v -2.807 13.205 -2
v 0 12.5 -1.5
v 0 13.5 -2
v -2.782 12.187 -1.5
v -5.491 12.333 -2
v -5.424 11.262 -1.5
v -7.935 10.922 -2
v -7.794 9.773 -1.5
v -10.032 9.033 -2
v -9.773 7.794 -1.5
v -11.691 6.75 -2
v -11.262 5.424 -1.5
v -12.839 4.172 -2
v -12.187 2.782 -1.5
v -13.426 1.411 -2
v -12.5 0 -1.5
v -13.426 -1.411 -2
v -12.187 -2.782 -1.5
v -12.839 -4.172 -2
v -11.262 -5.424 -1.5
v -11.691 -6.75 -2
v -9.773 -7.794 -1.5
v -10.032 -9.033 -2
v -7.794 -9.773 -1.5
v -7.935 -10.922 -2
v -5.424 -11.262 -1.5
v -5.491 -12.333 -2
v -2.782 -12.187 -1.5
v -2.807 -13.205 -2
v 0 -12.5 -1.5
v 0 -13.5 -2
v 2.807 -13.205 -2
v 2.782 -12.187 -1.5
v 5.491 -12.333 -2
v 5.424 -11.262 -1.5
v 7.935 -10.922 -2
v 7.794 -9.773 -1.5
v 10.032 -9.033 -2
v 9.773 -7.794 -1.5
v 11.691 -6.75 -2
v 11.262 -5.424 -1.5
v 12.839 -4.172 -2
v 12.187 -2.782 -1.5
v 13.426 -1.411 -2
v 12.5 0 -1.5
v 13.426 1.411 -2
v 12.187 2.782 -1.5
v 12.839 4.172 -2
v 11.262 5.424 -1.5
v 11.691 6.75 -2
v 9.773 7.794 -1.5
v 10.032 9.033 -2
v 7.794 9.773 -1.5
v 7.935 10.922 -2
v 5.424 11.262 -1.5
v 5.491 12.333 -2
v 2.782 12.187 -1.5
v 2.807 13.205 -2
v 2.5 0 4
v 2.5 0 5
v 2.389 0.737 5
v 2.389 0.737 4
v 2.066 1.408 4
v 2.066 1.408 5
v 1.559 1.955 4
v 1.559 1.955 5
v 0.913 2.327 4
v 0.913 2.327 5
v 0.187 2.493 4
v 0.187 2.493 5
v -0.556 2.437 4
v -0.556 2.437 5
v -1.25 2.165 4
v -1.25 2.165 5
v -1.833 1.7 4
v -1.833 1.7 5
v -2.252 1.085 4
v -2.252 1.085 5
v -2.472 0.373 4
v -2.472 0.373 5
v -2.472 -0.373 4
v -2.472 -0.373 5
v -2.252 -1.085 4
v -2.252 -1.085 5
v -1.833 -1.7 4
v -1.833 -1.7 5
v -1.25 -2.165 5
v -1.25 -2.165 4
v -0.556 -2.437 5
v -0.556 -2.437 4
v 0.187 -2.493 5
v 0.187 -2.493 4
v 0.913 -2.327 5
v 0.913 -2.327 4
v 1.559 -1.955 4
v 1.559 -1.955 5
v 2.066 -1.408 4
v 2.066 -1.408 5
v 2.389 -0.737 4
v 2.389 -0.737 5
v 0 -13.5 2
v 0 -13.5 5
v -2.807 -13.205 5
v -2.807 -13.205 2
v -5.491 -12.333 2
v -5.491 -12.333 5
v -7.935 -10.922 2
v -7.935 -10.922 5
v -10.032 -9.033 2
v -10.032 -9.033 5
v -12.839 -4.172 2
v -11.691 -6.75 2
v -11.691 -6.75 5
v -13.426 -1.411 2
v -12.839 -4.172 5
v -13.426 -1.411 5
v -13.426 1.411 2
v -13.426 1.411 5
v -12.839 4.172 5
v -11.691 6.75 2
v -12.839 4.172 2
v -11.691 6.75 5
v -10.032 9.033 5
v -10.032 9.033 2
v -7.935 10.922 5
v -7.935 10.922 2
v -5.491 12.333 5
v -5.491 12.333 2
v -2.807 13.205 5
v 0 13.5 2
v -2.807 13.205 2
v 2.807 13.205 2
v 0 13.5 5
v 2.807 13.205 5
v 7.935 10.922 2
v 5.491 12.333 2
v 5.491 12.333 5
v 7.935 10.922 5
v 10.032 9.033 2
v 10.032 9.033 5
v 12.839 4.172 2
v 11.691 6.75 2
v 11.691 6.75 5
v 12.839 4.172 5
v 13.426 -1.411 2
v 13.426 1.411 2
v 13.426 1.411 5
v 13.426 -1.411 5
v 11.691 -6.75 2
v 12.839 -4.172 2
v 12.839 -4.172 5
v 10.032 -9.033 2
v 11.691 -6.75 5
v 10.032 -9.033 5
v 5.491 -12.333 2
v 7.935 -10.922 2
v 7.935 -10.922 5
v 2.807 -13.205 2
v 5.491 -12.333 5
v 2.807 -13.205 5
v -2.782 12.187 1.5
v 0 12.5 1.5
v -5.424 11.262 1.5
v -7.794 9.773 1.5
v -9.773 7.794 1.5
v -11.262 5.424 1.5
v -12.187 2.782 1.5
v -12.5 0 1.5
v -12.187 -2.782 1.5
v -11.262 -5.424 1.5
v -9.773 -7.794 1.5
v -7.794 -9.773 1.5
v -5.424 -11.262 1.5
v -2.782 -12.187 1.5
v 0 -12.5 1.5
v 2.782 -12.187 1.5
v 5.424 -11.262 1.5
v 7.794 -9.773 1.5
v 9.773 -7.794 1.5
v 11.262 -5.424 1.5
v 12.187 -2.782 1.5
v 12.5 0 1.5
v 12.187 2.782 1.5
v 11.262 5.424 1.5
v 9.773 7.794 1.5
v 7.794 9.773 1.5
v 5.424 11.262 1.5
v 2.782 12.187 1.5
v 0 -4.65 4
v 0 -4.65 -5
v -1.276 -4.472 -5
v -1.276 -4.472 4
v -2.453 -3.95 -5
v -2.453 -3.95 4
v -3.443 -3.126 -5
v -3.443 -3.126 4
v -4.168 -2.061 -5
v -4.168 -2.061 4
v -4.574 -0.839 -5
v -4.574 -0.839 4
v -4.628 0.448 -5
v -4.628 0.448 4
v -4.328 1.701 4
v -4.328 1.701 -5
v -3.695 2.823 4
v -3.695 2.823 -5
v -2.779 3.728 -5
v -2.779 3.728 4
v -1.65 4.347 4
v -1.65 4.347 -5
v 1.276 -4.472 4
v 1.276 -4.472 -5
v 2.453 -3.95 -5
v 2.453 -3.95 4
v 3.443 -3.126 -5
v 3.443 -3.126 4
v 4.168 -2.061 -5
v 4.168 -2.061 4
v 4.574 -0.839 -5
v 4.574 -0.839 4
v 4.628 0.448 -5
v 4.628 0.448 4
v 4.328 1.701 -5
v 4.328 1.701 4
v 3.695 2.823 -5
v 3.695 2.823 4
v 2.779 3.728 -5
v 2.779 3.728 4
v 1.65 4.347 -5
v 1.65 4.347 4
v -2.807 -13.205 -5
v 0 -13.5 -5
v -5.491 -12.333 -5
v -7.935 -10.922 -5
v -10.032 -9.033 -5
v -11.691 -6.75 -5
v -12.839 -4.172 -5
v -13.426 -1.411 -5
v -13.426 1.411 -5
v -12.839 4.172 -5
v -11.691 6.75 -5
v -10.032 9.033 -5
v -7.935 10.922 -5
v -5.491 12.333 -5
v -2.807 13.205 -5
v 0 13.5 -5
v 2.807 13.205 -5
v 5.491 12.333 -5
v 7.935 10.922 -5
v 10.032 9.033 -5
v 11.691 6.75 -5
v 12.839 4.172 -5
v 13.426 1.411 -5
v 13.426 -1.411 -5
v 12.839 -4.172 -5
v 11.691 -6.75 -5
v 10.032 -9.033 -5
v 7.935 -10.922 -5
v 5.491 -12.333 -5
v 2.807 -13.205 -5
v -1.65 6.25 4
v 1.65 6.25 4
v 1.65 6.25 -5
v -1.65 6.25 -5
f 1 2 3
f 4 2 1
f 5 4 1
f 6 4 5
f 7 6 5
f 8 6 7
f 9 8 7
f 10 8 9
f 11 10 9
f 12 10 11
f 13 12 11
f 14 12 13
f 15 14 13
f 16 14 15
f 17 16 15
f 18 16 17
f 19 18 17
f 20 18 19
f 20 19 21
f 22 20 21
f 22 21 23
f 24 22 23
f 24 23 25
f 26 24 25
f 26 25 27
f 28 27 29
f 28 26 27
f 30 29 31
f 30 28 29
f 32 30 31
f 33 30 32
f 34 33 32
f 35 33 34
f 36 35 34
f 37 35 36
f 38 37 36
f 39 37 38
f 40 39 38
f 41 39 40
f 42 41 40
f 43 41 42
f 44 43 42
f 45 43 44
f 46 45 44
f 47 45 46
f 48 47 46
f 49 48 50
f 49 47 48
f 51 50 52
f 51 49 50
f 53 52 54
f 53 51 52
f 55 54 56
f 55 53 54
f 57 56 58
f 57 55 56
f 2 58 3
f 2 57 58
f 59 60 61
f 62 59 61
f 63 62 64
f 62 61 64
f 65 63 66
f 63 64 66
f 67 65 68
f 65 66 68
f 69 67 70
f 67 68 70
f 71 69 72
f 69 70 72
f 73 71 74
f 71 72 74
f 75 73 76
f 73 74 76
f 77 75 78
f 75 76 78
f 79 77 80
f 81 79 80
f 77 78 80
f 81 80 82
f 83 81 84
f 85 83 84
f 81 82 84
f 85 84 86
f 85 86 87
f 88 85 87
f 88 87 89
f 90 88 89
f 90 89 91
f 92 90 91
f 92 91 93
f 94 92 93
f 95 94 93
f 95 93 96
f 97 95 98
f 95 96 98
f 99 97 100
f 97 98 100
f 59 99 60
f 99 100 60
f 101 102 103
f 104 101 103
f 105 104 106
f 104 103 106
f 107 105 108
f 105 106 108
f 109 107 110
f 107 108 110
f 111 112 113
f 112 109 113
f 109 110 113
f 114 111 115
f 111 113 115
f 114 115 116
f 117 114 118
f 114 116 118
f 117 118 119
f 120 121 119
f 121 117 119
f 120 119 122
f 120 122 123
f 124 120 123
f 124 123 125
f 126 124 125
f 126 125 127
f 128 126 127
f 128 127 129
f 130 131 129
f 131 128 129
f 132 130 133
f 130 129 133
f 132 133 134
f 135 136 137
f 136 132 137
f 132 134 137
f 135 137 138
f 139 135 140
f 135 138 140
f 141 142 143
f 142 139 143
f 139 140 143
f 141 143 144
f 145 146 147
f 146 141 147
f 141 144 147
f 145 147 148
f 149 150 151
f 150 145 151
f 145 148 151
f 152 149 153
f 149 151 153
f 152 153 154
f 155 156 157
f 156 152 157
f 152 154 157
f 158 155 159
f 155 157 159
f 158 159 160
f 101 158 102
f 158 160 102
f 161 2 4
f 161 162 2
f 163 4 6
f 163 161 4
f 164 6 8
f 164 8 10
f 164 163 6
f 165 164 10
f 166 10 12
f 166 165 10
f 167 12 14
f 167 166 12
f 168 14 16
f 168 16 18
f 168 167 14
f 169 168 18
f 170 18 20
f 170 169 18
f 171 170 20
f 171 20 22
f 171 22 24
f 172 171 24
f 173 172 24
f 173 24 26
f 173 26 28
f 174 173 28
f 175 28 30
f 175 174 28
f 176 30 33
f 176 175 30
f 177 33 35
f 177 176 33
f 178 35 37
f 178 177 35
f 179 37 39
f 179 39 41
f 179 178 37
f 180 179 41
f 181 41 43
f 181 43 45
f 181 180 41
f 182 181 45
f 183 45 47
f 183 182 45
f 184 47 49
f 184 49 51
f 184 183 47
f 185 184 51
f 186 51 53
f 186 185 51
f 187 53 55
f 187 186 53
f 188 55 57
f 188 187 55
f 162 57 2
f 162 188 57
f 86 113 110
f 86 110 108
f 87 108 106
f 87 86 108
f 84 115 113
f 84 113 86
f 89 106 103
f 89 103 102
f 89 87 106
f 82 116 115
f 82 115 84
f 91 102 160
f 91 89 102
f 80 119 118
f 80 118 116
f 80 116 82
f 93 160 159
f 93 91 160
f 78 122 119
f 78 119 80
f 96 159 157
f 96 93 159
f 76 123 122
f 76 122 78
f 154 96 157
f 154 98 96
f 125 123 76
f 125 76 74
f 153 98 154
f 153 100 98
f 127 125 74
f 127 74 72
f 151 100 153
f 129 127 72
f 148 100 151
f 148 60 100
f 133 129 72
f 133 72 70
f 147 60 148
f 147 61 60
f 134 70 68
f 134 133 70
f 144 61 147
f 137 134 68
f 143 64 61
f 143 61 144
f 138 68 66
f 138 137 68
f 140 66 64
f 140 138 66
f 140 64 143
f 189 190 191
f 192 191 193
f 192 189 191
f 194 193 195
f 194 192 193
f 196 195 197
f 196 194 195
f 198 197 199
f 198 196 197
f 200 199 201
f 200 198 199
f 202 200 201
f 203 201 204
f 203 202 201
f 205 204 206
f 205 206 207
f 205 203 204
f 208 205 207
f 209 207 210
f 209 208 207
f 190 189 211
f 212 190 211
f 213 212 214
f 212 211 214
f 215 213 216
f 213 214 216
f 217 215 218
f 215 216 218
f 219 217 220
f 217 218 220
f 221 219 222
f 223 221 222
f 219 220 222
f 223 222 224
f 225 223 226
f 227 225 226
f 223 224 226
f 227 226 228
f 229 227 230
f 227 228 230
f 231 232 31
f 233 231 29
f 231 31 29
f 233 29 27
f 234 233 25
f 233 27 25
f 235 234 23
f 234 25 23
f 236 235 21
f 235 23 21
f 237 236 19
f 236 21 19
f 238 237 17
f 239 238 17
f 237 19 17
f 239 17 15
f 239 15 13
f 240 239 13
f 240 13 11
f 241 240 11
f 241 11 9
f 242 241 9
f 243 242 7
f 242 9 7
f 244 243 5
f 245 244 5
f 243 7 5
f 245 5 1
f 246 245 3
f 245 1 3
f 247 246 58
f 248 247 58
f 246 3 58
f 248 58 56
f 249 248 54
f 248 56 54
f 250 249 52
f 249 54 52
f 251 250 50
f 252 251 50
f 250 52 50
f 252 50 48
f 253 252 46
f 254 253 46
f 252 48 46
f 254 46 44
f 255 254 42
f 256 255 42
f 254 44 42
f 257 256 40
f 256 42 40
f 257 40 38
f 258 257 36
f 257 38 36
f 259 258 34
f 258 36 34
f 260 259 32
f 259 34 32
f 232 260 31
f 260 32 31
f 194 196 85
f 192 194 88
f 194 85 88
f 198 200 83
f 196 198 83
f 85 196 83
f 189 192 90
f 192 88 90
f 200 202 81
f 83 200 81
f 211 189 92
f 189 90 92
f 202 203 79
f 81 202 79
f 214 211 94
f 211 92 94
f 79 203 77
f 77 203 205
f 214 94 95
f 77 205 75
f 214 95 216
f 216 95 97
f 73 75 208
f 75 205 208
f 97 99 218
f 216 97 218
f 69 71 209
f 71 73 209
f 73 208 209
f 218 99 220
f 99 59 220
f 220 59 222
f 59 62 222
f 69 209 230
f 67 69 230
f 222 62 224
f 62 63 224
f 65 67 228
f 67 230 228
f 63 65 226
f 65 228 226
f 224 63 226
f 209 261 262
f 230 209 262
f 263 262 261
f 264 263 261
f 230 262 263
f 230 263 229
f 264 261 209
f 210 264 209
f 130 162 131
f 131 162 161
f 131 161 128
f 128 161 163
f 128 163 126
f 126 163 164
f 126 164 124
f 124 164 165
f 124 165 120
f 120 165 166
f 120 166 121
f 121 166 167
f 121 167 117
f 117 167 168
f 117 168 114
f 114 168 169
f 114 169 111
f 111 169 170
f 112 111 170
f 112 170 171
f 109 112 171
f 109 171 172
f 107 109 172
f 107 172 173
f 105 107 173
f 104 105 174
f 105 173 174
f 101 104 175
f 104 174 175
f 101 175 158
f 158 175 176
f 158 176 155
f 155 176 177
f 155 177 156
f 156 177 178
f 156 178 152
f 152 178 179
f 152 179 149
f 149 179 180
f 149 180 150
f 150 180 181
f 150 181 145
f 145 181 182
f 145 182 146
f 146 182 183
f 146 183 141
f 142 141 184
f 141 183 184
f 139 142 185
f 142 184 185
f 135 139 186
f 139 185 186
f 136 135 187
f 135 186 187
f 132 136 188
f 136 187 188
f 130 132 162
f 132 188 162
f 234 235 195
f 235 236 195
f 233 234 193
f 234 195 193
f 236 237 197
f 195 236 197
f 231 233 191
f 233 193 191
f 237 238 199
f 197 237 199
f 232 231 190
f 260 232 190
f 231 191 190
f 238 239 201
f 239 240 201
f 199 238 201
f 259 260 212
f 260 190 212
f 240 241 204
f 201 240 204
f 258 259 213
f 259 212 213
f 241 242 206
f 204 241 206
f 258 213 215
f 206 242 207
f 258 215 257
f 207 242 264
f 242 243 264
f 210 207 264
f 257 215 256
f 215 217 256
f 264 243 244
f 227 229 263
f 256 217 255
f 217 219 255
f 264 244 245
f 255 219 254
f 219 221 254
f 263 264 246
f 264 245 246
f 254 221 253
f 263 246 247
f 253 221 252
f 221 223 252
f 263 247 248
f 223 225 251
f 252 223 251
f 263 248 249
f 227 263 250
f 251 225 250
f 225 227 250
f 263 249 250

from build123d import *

# Parameters (mm, degrees)
PAD_DEPTH     = 5
SKETCH003_R   = 8.028816
SKETCH003_R_2 = 2.5
PAD001_DEPTH  = 1


with BuildPart() as part:
    # Sketch → Pad (new body, symmetric)
    with BuildSketch(Plane.XY):
        with BuildLine():
            ThreePointArc((0, -4.65), (4.573728, -0.838758), (1.65, 4.347413))
            Line((1.65, 6.25), (1.65, 4.347413))
            Line((0, 6.25), (1.65, 6.25))
            Line((0, 13.5), (0, 6.25))
            ThreePointArc((0, -13.5), (13.5, 0), (0, 13.5))
            Line((0, -4.65), (0, -13.5))
        make_face()
    pad = extrude(amount=PAD_DEPTH, both=True)

    # Mirrored: Pad across Sketch V_Axis
    add(pad.mirror(Plane(origin=(0, 0, 0), x_dir=(0, 0, 1), z_dir=(1, 0, 0))))

    # Sketch001 → Groove (revolve, cut)
    with BuildSketch(Plane.YZ):
        Polygon((13.5, 0), (13.5, 2), (12.5, 1.5), (12.5, 0), align=None)
    groove = revolve(axis=Axis((0, 0, 0), (0, 0, 1)), mode=Mode.SUBTRACT)

    # Mirrored001: Groove across Sketch001 H_Axis
    add(groove.mirror(Plane.XY), mode=Mode.SUBTRACT)

    # Sketch003 → Pad001 (join)
    with BuildSketch(Plane.XY.offset(5)):
        Circle(SKETCH003_R)
        Circle(SKETCH003_R_2, mode=Mode.SUBTRACT)
    extrude(amount=-PAD001_DEPTH)


solid = part.part
